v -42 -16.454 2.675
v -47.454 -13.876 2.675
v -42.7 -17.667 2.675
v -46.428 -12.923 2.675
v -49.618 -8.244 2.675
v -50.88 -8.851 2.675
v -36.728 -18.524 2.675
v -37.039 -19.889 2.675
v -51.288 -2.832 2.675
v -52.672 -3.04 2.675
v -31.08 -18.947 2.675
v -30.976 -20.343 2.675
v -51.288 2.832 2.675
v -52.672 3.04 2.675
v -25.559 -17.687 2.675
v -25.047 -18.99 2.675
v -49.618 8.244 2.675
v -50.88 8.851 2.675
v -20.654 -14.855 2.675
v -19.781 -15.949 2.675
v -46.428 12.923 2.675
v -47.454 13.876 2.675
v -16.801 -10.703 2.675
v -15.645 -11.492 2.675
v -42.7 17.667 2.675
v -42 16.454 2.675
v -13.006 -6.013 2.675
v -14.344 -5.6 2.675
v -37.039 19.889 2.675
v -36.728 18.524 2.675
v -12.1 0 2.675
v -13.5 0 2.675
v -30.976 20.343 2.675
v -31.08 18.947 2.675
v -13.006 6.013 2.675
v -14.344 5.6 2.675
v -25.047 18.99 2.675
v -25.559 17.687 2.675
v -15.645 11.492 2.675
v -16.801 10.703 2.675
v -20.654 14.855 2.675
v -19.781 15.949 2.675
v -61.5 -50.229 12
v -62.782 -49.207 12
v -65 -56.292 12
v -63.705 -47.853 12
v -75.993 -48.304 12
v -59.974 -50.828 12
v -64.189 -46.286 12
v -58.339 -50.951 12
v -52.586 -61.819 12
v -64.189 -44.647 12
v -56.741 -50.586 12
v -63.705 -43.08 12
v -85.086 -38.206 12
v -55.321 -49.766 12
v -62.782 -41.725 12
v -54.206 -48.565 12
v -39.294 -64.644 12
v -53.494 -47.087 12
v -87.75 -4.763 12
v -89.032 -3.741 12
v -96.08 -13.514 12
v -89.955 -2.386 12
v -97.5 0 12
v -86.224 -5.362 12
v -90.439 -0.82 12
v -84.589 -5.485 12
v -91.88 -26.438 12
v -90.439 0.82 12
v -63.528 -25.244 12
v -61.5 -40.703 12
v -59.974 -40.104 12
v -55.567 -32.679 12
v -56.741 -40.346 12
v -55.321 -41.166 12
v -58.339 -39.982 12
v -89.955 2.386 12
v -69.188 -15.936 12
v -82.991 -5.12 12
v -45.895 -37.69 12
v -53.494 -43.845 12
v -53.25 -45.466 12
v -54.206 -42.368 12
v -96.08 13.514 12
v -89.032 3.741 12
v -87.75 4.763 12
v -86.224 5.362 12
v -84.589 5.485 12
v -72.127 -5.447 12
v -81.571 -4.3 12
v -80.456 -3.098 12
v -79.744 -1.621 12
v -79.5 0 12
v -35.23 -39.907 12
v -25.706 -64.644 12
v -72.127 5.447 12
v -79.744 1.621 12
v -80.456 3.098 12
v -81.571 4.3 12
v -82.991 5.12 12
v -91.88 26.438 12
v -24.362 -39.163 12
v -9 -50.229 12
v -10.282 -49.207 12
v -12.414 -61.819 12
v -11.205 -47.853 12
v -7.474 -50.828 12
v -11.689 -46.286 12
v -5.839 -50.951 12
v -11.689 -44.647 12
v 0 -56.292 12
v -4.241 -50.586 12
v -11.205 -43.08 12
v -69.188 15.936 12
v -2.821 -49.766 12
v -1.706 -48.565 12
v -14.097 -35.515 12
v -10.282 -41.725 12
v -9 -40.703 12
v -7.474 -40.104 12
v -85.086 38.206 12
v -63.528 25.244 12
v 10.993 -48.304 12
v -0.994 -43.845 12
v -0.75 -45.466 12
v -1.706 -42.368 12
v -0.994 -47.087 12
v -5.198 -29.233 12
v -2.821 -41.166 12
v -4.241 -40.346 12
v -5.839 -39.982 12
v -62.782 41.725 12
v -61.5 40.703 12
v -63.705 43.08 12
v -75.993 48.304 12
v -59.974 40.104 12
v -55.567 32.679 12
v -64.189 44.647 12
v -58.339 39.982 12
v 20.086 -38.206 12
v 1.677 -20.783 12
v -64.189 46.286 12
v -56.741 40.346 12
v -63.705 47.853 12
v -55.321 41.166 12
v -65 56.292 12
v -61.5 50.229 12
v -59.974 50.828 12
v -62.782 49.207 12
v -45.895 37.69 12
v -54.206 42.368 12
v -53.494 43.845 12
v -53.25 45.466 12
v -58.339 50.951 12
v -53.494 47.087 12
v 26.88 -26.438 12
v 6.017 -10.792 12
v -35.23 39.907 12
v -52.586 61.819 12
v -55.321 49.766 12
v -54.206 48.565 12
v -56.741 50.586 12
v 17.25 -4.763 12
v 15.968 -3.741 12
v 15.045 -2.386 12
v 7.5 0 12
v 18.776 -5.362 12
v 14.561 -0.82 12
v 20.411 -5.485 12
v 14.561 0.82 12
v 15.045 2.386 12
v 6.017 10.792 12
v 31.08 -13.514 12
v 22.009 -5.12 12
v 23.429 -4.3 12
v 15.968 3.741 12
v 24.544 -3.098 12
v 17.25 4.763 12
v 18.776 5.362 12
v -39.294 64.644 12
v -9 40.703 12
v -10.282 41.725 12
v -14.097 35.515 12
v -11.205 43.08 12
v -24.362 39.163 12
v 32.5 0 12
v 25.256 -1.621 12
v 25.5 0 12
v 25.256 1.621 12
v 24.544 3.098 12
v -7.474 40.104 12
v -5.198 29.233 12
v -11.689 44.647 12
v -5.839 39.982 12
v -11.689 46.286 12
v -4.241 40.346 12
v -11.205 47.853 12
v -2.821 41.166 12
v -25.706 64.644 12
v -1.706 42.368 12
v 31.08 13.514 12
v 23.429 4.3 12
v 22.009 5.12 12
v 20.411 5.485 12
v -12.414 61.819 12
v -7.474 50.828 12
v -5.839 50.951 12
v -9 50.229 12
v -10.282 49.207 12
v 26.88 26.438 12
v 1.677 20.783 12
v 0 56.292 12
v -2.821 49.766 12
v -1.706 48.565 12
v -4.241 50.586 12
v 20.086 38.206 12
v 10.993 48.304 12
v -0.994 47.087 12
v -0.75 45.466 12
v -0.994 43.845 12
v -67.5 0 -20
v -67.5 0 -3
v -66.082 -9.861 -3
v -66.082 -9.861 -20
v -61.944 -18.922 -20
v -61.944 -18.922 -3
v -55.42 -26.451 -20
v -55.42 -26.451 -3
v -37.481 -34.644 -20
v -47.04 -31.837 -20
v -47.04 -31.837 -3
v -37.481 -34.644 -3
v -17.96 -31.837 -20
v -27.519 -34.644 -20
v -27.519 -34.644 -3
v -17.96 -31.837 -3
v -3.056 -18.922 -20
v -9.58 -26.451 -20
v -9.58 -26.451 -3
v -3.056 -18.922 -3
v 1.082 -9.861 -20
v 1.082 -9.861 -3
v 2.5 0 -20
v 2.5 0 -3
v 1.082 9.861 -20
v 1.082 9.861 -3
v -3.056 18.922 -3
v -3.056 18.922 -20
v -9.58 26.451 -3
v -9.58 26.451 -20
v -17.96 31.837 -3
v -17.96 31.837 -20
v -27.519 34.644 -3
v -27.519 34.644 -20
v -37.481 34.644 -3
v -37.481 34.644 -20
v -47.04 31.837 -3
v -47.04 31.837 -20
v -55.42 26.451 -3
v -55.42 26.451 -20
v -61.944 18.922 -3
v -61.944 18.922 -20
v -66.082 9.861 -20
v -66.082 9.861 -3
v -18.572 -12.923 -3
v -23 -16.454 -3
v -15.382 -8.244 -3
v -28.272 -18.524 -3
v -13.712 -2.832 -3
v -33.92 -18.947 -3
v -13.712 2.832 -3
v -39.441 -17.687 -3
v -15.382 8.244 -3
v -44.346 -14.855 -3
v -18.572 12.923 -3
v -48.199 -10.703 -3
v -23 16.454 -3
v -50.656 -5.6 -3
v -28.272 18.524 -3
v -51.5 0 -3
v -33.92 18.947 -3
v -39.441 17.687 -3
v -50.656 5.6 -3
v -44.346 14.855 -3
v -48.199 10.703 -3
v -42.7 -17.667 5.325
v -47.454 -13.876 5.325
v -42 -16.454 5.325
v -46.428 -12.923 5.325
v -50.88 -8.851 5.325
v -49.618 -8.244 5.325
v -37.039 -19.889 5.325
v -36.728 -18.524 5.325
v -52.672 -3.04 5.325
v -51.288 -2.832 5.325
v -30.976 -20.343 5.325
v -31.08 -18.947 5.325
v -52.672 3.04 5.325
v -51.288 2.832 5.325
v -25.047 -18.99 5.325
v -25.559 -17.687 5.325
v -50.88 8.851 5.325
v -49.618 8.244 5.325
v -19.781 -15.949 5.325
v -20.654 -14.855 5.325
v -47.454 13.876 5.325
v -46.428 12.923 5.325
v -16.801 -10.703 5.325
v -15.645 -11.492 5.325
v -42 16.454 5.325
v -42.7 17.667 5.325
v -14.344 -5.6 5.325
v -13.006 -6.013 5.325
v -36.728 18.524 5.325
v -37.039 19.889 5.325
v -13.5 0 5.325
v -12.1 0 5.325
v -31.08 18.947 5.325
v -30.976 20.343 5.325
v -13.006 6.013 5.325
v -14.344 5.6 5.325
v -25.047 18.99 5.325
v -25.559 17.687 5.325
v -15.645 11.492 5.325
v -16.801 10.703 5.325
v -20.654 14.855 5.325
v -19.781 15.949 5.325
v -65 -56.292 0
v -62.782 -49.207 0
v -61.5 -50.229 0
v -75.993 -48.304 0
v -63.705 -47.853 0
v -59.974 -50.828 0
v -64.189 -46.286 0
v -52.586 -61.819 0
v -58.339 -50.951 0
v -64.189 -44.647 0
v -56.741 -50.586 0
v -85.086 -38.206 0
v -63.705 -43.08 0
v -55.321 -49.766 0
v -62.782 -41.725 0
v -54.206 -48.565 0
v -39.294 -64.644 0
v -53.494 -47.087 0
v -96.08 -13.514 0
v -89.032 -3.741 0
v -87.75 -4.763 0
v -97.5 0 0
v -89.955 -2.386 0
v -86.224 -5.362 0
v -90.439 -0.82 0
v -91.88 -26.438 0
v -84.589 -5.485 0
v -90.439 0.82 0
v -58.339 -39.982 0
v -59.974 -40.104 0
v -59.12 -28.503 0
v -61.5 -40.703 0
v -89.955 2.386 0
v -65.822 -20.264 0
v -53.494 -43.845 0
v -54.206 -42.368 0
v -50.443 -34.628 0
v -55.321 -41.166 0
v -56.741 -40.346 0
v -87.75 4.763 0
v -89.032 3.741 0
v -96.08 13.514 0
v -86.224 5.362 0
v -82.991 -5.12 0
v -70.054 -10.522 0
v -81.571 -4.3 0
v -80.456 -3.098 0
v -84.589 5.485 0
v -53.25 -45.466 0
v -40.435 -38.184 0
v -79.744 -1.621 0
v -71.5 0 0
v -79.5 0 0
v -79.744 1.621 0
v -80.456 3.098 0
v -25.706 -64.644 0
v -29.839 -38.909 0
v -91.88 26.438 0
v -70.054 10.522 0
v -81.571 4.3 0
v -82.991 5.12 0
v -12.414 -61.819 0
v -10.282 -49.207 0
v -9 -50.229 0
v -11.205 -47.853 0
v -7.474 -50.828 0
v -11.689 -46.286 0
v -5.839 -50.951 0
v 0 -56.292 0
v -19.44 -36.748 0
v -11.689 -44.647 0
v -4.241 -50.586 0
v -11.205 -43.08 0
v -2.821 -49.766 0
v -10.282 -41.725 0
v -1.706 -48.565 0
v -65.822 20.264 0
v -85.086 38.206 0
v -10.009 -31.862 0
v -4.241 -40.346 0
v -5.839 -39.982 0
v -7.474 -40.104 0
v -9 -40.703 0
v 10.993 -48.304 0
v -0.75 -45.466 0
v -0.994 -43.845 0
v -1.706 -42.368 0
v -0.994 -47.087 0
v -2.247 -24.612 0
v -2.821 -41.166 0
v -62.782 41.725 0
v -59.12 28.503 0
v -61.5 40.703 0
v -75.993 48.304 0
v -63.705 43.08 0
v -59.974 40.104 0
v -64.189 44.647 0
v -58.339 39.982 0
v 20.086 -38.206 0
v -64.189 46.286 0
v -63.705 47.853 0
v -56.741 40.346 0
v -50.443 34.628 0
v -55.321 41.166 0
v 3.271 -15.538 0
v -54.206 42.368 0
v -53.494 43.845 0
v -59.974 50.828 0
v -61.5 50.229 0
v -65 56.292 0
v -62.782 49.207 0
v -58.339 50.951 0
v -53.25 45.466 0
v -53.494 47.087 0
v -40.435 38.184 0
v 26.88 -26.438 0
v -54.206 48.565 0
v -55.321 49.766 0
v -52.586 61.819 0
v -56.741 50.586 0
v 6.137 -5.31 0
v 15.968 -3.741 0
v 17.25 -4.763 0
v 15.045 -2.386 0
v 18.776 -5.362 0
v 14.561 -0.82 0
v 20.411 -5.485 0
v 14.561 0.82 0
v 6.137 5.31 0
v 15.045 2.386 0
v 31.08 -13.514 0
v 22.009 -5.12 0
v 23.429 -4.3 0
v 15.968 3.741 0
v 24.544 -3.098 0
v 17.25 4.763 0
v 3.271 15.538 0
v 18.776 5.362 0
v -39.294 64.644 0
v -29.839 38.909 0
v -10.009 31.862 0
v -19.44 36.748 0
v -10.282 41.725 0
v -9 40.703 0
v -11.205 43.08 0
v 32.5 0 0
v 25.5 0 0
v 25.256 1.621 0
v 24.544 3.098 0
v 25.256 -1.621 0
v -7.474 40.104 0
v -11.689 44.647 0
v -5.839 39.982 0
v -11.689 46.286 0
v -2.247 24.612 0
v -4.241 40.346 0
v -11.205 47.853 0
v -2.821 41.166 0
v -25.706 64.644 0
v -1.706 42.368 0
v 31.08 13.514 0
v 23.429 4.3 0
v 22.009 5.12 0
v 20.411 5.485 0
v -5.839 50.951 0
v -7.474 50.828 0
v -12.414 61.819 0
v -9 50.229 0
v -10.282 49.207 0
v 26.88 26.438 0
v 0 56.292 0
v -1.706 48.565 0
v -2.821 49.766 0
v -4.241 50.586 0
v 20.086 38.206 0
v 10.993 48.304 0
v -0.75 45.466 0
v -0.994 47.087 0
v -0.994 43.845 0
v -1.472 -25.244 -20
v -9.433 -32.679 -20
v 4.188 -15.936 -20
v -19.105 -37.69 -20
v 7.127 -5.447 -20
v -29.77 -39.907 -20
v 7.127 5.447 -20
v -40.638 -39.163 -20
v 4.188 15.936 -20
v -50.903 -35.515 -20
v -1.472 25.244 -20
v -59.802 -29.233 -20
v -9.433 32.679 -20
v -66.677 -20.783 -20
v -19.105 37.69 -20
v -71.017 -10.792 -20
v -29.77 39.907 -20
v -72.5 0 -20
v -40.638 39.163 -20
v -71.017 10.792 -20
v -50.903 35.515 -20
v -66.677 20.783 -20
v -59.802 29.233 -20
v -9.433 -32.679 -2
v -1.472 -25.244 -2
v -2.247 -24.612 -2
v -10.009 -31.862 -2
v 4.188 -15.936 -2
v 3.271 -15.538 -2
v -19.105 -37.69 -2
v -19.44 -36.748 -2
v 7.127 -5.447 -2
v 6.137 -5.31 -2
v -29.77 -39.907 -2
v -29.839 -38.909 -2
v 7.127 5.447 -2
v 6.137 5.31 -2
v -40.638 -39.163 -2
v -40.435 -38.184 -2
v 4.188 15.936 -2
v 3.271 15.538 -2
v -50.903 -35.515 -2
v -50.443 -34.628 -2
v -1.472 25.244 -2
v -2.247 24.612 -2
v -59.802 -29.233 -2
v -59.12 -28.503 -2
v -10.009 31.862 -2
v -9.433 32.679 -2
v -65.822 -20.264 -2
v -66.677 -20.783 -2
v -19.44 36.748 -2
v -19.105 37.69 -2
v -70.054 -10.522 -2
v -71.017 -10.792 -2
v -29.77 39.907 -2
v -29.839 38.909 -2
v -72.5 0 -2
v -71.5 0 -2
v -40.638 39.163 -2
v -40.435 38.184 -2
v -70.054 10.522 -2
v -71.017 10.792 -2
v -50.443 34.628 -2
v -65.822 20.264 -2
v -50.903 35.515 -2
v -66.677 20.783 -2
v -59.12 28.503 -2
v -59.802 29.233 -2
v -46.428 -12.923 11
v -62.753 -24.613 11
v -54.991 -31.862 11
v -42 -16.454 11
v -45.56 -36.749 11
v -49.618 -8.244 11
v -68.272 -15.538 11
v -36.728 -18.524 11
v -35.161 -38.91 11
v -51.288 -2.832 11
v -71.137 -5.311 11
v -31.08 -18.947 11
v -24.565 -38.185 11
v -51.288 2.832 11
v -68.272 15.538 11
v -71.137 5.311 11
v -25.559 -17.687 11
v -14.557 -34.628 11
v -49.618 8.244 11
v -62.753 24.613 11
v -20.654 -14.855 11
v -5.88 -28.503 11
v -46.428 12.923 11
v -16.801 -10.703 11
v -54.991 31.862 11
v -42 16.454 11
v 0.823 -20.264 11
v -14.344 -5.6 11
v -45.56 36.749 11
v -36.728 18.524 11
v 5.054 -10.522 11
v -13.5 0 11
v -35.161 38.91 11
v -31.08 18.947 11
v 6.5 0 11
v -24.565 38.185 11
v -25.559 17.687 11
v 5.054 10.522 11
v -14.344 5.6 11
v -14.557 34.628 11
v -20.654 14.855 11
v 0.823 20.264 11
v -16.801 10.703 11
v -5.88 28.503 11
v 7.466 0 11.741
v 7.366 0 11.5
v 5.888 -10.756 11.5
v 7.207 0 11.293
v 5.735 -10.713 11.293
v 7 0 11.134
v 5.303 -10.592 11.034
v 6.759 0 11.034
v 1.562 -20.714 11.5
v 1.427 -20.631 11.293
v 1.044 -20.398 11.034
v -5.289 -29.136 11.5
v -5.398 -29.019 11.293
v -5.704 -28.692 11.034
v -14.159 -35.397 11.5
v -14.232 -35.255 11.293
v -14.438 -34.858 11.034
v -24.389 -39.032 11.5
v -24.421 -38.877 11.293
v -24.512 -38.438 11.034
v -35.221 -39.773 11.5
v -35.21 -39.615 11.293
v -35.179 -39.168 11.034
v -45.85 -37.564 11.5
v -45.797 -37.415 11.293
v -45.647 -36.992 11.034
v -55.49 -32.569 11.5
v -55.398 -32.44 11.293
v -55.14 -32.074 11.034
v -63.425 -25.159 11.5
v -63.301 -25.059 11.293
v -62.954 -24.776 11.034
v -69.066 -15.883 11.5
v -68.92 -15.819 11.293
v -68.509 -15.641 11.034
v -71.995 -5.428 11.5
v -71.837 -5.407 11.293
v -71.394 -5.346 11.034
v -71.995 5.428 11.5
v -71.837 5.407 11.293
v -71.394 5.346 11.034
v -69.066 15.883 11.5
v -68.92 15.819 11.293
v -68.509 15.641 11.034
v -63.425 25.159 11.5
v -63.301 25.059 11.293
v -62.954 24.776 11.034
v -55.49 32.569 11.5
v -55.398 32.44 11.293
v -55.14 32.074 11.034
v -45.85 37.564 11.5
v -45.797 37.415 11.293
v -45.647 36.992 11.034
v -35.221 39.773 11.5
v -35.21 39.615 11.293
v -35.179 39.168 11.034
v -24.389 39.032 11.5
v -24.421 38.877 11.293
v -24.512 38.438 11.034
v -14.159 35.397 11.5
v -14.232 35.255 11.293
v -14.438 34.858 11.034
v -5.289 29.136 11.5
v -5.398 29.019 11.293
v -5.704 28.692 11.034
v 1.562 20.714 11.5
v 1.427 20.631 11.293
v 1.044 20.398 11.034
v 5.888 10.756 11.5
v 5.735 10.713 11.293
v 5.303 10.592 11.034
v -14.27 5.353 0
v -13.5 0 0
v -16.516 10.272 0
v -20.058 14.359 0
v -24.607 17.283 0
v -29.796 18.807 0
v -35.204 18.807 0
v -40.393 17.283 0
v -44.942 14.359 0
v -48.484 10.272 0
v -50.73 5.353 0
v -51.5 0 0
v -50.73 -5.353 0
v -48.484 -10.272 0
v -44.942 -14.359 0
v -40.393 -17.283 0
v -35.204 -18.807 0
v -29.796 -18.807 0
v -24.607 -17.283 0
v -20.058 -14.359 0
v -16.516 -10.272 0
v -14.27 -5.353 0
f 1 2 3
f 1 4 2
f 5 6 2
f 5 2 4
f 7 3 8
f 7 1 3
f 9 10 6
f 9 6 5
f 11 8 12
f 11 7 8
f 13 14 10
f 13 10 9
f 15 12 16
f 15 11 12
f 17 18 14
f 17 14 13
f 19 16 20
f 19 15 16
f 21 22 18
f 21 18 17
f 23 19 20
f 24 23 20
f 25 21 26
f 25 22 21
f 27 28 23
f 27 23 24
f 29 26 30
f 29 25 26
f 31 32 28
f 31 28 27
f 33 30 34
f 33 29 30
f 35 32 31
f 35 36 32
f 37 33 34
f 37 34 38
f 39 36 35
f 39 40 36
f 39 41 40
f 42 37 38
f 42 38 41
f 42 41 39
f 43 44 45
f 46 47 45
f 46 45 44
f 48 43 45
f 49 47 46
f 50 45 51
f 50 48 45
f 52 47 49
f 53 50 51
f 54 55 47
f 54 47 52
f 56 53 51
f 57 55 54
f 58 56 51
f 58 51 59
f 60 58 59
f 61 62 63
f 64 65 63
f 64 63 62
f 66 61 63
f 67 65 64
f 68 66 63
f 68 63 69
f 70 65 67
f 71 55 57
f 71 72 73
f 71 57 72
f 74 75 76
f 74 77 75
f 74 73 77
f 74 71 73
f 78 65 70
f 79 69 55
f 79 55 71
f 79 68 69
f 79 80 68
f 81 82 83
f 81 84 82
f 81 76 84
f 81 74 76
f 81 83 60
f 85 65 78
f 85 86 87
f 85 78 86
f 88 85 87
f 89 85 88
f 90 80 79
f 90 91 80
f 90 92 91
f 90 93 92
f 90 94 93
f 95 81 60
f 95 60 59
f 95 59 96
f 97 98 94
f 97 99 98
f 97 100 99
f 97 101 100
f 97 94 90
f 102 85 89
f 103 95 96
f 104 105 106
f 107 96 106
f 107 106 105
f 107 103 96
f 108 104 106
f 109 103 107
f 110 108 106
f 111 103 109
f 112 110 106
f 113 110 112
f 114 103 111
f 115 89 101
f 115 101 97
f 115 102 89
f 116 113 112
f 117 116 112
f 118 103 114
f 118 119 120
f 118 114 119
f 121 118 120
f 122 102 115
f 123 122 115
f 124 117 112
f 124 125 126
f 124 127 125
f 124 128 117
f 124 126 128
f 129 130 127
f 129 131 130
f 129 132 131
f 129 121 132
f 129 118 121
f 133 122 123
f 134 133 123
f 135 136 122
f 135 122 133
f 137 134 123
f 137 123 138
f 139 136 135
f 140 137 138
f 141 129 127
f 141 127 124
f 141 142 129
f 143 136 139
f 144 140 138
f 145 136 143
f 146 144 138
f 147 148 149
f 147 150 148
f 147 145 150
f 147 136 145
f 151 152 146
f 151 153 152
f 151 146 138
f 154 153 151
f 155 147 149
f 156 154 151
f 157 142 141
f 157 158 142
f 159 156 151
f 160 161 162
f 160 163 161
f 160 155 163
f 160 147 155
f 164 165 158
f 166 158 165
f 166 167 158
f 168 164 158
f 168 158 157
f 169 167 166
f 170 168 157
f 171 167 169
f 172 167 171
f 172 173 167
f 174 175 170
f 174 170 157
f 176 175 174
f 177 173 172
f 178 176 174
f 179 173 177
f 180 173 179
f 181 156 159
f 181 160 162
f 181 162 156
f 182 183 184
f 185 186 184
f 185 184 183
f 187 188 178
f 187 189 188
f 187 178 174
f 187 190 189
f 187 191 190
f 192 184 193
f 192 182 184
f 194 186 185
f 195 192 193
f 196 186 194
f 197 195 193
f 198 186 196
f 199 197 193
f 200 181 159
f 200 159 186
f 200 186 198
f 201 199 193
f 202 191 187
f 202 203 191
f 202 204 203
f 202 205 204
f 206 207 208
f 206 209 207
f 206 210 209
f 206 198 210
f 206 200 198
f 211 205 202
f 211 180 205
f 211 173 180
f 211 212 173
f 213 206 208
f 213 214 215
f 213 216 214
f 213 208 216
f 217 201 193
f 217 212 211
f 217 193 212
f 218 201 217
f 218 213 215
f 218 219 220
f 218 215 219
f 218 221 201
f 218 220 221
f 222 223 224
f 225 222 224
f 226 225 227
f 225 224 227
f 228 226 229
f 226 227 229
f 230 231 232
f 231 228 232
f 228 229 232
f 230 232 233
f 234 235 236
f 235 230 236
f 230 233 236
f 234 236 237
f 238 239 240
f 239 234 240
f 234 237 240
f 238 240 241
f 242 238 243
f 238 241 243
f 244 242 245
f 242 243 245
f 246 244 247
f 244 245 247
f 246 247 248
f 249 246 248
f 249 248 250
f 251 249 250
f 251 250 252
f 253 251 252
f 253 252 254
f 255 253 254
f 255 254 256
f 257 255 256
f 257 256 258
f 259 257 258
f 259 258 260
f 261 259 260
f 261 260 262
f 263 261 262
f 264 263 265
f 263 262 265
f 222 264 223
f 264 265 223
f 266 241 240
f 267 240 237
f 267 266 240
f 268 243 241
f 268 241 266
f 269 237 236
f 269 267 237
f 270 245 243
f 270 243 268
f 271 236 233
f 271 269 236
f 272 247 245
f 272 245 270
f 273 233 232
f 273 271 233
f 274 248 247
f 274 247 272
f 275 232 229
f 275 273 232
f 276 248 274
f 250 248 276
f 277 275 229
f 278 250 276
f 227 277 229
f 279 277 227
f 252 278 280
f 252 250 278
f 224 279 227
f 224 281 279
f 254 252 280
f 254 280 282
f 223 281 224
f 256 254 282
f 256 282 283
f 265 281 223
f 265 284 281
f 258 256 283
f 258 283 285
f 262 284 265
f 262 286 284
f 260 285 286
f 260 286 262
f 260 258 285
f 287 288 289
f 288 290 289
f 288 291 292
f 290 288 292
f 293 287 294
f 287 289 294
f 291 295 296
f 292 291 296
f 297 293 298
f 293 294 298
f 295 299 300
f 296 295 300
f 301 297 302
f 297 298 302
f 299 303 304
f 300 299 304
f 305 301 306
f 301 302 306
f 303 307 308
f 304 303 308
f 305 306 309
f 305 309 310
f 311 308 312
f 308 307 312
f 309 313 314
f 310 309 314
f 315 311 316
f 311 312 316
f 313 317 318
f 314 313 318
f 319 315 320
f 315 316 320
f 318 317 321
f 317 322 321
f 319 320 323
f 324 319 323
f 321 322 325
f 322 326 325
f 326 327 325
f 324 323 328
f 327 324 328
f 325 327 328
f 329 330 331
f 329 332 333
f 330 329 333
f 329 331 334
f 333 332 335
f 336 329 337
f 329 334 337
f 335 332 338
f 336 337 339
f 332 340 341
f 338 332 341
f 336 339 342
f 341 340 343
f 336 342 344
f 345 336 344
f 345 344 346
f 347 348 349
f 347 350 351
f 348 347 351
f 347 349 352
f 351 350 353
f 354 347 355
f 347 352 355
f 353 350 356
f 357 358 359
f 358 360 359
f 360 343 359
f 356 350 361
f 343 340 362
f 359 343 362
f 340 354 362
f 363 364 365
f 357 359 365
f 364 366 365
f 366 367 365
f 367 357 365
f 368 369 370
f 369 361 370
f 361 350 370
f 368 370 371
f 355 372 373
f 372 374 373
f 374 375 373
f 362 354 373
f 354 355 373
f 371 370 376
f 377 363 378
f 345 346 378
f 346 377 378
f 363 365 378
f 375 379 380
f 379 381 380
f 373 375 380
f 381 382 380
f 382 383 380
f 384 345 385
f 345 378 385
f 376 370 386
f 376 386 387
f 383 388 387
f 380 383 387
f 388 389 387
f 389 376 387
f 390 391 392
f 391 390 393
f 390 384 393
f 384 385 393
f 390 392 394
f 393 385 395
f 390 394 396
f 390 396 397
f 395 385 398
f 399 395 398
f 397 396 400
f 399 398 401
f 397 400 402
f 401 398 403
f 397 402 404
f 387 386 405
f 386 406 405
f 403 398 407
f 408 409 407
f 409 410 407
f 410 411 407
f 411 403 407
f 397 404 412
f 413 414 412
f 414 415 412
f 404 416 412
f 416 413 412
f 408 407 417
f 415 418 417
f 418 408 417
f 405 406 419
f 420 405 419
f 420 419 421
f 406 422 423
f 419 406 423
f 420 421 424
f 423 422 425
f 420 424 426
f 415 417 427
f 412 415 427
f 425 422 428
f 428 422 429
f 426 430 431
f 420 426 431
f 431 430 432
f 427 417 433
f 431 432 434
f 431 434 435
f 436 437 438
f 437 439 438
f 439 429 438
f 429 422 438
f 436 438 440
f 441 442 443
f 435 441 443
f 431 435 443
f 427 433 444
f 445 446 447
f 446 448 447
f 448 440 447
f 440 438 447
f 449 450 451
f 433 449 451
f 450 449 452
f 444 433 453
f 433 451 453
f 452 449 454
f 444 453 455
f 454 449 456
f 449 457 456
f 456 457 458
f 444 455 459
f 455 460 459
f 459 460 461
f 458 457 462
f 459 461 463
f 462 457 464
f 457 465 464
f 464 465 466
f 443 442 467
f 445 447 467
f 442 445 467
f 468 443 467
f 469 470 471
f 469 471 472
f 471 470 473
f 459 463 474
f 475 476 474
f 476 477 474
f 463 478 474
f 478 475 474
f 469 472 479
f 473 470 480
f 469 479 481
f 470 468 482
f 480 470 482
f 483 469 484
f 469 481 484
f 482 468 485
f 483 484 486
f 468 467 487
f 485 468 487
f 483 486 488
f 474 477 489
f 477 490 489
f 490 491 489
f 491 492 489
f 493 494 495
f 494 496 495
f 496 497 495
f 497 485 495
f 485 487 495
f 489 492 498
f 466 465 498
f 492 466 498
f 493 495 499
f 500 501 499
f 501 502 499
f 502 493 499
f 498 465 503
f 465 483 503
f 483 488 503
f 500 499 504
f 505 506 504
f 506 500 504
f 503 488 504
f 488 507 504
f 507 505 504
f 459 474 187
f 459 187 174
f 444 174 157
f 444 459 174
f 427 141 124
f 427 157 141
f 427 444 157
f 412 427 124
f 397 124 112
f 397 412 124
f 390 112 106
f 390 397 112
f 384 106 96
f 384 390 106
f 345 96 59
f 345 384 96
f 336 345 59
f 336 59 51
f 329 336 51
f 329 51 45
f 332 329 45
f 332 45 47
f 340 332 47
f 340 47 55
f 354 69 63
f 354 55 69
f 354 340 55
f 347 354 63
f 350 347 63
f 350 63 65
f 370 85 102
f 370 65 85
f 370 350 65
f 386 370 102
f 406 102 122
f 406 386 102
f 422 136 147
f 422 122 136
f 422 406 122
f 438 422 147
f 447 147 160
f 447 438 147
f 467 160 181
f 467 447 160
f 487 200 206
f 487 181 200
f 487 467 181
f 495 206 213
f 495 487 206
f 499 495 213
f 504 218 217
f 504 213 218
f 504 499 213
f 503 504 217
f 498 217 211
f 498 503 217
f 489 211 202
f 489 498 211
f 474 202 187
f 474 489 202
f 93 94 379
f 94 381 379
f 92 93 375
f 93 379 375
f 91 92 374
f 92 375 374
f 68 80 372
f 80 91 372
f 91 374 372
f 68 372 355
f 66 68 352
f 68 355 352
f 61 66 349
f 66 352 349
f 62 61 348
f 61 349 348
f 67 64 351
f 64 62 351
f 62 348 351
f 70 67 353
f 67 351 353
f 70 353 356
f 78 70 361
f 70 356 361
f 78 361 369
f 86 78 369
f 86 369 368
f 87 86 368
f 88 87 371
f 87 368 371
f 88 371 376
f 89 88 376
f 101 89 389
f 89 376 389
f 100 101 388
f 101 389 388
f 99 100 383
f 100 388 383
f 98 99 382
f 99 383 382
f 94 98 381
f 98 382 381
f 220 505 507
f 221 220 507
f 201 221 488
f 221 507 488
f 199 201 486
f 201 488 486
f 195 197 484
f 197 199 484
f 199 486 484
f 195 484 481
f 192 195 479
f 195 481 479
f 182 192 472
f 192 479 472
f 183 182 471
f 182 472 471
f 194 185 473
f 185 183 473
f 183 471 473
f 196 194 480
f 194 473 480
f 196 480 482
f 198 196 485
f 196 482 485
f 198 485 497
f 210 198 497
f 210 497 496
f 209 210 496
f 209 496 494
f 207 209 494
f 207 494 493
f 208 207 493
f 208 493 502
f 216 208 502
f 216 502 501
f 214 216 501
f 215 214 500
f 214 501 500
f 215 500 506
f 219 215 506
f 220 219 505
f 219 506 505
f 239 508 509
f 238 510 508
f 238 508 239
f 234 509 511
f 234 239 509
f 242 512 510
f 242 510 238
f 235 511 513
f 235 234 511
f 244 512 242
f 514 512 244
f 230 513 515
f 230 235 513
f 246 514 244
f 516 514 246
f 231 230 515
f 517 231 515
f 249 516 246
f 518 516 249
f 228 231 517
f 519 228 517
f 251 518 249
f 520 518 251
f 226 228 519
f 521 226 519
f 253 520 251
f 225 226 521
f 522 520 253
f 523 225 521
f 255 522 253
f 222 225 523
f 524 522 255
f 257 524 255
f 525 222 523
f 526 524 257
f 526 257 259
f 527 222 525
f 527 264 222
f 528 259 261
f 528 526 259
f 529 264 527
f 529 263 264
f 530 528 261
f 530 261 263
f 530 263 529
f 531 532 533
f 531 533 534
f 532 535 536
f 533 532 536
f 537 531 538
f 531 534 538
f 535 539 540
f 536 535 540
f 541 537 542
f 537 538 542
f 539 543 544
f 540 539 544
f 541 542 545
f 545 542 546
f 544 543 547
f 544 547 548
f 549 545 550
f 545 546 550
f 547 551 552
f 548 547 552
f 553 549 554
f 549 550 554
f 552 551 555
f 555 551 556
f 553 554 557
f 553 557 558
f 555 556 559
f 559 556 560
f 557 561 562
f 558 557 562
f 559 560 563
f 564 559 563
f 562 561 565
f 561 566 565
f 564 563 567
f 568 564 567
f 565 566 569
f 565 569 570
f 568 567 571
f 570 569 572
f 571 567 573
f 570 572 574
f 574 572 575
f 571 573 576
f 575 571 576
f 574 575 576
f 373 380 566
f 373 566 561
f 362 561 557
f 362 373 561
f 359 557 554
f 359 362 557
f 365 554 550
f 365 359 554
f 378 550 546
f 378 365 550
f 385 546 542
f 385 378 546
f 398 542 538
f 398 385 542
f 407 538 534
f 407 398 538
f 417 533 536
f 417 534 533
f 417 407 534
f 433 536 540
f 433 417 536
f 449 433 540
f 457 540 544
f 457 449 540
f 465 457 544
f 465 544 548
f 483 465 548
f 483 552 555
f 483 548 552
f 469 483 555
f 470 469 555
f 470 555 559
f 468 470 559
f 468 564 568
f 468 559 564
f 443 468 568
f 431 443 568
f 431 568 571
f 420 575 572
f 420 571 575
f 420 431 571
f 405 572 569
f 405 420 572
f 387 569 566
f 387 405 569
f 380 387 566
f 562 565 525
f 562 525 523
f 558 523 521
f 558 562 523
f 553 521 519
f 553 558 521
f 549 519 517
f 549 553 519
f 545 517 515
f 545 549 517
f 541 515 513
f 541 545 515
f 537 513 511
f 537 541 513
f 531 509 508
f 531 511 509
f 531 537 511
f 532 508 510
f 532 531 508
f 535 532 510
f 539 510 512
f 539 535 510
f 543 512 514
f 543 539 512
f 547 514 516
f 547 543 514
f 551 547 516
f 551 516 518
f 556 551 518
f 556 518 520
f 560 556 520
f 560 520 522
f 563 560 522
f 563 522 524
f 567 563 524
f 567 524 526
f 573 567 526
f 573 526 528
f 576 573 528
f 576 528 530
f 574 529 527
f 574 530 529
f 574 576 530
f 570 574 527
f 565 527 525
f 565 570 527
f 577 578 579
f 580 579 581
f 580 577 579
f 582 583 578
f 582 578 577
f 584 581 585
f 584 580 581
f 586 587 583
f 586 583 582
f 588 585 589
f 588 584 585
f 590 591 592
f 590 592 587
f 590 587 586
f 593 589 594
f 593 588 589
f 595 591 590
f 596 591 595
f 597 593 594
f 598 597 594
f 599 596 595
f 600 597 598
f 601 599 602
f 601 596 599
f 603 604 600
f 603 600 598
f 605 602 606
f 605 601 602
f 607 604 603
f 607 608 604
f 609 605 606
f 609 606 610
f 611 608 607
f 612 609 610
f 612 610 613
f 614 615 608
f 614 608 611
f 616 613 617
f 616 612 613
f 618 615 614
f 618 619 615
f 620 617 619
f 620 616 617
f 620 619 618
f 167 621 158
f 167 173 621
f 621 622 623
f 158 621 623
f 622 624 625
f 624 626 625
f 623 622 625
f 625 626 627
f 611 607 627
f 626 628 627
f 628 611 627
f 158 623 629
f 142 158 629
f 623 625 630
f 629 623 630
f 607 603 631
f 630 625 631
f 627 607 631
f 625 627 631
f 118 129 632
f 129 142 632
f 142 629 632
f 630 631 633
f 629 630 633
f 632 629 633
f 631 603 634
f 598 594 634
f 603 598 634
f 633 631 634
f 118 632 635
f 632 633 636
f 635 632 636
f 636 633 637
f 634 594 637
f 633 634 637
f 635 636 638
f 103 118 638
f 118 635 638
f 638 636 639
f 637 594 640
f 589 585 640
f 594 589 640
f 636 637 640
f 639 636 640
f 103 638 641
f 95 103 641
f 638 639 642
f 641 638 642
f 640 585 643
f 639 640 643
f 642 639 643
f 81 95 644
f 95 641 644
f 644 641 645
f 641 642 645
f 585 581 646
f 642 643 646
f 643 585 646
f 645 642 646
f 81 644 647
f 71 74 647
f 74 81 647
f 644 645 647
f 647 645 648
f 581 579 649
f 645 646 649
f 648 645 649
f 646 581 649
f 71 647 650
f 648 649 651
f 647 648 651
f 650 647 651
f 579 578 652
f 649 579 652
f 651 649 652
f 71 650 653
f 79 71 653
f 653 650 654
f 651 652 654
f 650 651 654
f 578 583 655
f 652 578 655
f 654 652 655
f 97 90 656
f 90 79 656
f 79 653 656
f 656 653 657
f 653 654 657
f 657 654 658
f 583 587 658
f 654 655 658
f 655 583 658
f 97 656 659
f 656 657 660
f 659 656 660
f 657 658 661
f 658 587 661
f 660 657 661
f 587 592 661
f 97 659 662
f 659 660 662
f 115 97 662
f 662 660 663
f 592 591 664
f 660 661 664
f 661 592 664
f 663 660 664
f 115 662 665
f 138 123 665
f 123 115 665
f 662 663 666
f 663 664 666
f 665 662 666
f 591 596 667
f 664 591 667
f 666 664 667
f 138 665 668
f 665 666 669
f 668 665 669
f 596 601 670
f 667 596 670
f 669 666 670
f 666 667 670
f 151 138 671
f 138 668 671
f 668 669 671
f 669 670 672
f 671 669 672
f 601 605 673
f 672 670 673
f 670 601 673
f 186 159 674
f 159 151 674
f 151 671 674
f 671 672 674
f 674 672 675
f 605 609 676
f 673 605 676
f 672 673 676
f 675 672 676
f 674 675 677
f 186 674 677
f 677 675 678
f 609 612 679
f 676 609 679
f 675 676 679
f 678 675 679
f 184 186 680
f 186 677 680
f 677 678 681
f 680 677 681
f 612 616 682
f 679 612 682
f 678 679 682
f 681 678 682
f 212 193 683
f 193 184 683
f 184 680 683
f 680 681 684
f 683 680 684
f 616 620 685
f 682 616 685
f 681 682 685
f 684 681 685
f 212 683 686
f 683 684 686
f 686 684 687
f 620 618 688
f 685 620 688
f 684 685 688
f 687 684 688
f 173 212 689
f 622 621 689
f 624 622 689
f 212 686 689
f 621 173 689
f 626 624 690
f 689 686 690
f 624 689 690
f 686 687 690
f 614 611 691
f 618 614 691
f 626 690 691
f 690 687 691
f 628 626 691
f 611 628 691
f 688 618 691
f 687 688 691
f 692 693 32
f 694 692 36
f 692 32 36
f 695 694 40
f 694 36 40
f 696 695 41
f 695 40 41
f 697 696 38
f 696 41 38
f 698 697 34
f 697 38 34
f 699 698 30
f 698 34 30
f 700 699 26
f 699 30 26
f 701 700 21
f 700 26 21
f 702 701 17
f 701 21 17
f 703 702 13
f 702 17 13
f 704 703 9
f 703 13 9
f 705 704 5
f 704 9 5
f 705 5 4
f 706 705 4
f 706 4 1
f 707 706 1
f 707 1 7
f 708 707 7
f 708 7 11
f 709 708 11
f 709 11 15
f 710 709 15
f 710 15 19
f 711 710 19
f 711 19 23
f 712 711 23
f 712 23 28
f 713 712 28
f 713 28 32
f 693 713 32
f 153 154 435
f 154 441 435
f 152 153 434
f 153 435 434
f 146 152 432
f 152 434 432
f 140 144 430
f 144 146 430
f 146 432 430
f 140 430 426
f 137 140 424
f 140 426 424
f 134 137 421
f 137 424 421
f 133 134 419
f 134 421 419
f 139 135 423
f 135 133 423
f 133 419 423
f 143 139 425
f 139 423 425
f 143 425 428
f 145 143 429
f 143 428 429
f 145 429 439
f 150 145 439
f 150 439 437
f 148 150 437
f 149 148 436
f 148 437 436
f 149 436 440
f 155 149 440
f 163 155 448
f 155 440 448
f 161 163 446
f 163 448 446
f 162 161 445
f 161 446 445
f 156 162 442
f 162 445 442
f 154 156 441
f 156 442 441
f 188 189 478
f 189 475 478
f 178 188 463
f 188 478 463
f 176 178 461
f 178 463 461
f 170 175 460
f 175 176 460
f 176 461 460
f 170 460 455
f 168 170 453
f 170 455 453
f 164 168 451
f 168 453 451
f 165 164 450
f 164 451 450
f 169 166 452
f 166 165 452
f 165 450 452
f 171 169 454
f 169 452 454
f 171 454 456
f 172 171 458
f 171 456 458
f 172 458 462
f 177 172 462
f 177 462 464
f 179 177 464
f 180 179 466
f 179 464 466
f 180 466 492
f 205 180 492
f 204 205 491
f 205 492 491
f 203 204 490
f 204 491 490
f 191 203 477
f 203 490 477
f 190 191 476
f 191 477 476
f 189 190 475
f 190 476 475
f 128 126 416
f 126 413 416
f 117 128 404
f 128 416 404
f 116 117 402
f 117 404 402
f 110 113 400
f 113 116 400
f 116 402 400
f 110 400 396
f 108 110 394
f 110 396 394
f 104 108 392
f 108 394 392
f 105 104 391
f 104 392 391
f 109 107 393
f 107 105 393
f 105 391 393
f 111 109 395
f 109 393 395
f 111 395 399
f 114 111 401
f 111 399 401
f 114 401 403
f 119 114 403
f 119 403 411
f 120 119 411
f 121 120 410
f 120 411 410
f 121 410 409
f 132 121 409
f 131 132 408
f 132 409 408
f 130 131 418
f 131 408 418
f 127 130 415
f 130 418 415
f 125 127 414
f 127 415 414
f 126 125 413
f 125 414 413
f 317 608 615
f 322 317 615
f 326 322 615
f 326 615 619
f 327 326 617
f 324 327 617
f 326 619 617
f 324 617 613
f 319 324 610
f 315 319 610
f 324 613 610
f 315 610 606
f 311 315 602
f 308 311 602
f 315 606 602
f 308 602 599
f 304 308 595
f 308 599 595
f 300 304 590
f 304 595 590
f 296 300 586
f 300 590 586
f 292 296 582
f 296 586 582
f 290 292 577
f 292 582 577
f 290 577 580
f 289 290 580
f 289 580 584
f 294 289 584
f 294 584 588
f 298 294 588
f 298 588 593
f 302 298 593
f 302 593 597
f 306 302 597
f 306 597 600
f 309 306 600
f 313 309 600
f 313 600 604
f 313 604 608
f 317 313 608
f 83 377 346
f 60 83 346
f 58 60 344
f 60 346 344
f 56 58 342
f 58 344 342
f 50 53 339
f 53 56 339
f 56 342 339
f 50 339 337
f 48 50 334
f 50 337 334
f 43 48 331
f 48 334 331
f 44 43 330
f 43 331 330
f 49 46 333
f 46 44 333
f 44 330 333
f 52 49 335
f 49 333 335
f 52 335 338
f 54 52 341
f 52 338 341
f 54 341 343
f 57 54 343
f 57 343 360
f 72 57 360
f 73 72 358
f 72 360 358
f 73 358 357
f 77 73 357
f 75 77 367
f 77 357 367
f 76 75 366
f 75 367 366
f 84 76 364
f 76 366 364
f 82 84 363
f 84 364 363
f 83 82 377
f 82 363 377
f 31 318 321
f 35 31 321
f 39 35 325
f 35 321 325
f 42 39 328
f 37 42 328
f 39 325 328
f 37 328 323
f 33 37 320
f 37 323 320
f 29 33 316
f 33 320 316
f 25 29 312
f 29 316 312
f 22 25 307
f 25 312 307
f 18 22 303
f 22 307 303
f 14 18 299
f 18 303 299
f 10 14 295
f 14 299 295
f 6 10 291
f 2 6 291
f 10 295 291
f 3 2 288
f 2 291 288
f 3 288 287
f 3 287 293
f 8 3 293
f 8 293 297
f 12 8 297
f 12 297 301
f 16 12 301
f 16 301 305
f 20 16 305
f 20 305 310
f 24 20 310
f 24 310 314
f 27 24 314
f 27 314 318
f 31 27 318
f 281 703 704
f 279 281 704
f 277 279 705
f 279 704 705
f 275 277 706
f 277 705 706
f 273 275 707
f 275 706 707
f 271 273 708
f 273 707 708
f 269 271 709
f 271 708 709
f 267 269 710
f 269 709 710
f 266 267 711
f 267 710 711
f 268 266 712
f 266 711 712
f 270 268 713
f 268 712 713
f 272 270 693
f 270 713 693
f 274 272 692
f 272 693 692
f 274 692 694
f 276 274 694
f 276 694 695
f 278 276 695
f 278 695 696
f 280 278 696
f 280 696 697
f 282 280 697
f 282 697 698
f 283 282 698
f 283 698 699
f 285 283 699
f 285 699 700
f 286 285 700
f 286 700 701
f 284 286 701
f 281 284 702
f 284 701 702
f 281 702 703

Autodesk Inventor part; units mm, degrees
ref_plane "工作平面1" through (0, 0, 0) normal (0, 0, 1) x (1, 0, 0)
sketch "草图1" plane through (0, 0, 0) normal (0, 0, 1) x (1, 0, 0)
  arc A0 (-32.5, -65) -> (-32.5, 65) centre (-32.5, 0) ccw construction
  line L0 (-32.5, 40) -> (-32.5, 65) construction
  arc A1 (-32.5, -40) -> (-32.5, 40) centre (-32.5, 0) ccw construction
  line L1 (-32.5, -65) -> (-32.5, -40) construction
  circle A2 centre (-32.5, 0) radius 65
  circle A3 centre (-32.5, 0) radius 40
  circle A4 centre (-32.5, 0) radius 52.5 construction
  circle A5 centre (-85, 0) radius 5.5
  line L2 (-123.5, 0) -> (58.5, 0) construction
  circle A6 centre (-58.75, -45.4663) radius 5.5
  circle A7 centre (-6.25, -45.4663) radius 5.5
  circle A8 centre (20, 0) radius 5.5
  circle A9 centre (-6.25, 45.4663) radius 5.5
  circle A10 centre (-58.75, 45.4663) radius 5.5
  circle A11 centre (-32.5, 0) radius 35
  point P0 (0, 0)
  dimension "d0" = 105
  dimension "d1" = 11
  dimension "d4" = 360
  dimension "d6" = 70
extrude "拉伸1" add sketch "草图1" along normal blind 12 contours A2 | A3 | A11
sketch "草图2" plane through (-32.5, 0, 0) normal (0, 0, -1) x (-1, 0, 0)
  circle A0 centre (0, 0) radius 65 construction
  circle A1 centre (0, 0) radius 35
  circle A2 centre (0, 0) radius 40
  point P0 (-32.5, 0)
  dimension "d9" = 70
  dimension "d10" = 80
extrude "拉伸2" add sketch "草图2" along normal blind 20
sketch "草图3" plane through (-32.5, 0, 12) normal (0, 0, 1) x (1, 0, 0)
  circle A0 centre (0, 0) radius 18 construction
  circle A1 centre (0, 0) radius 19
  point P0 (32.5, 0)
  dimension "d23" = 38
extrude "拉伸3" cut sketch "草图3" against normal up to surface (12 mm away)
sketch "草图4" plane through (-32.5, 0, 12) normal (0, 0, 1) x (1, 0, 0)
  line L0 (-91, 0) -> (91, 0) construction
  circle A0 centre (0, 0) radius 65 construction
  line L1 (0, -101.0835) -> (0, 92.1895) construction
  circle A1 centre (0, 0) radius 40
  circle A2 centre (-52.5, 0) radius 5.5 construction
  circle A3 centre (0, 0) radius 19 projected
  point P0 (32.5, 0)
  dimension "d16" = 80
extrude "拉伸4" cut sketch "草图4" against normal blind 1
fillet "圆角1" radius 1 1 edges at (-72.5, 0, 11)
ref_plane "工作平面2" through (-32.5, 0, 6) normal (0, 0, 1) x (1, 0, 0)
sketch "草图5" plane through (-32.5, 0, 0) normal (0, 0, -1) x (-1, 0, 0)
  circle A0 centre (0, 0) radius 40 projected
  circle A1 centre (0, 0) radius 39
  point P0 (-32.5, 0)
  dimension "d20" = 1
extrude "拉伸5" cut sketch "草图5" along normal blind 2
sketch "草图6" plane through (-32.5, 0, 0) normal (0, 0, -1) x (-1, 0, 0)
  circle A0 centre (0, 0) radius 19 projected
  circle A1 centre (0, 0) radius 35 projected
  point P0 (-32.5, 0)
extrude "拉伸6" add sketch "草图6" along normal blind 3
ref_plane "工作平面3" through (-32.5, 0, 4) normal (0, 0, 1) x (1, 0, 0)
sketch "草图7" plane through (-32.5, 0, 4) normal (0, 0, 1) x (1, 0, 0)
  circle A0 centre (0, 0) radius 19 construction
  circle A1 centre (0, 0) radius 20.4
  point P0 (32.5, 0)
  dimension "d27" = 40.8
extrude "拉伸7" cut sketch "草图7" against normal mid plane 2.65
properties part number "轴承端盖1"
